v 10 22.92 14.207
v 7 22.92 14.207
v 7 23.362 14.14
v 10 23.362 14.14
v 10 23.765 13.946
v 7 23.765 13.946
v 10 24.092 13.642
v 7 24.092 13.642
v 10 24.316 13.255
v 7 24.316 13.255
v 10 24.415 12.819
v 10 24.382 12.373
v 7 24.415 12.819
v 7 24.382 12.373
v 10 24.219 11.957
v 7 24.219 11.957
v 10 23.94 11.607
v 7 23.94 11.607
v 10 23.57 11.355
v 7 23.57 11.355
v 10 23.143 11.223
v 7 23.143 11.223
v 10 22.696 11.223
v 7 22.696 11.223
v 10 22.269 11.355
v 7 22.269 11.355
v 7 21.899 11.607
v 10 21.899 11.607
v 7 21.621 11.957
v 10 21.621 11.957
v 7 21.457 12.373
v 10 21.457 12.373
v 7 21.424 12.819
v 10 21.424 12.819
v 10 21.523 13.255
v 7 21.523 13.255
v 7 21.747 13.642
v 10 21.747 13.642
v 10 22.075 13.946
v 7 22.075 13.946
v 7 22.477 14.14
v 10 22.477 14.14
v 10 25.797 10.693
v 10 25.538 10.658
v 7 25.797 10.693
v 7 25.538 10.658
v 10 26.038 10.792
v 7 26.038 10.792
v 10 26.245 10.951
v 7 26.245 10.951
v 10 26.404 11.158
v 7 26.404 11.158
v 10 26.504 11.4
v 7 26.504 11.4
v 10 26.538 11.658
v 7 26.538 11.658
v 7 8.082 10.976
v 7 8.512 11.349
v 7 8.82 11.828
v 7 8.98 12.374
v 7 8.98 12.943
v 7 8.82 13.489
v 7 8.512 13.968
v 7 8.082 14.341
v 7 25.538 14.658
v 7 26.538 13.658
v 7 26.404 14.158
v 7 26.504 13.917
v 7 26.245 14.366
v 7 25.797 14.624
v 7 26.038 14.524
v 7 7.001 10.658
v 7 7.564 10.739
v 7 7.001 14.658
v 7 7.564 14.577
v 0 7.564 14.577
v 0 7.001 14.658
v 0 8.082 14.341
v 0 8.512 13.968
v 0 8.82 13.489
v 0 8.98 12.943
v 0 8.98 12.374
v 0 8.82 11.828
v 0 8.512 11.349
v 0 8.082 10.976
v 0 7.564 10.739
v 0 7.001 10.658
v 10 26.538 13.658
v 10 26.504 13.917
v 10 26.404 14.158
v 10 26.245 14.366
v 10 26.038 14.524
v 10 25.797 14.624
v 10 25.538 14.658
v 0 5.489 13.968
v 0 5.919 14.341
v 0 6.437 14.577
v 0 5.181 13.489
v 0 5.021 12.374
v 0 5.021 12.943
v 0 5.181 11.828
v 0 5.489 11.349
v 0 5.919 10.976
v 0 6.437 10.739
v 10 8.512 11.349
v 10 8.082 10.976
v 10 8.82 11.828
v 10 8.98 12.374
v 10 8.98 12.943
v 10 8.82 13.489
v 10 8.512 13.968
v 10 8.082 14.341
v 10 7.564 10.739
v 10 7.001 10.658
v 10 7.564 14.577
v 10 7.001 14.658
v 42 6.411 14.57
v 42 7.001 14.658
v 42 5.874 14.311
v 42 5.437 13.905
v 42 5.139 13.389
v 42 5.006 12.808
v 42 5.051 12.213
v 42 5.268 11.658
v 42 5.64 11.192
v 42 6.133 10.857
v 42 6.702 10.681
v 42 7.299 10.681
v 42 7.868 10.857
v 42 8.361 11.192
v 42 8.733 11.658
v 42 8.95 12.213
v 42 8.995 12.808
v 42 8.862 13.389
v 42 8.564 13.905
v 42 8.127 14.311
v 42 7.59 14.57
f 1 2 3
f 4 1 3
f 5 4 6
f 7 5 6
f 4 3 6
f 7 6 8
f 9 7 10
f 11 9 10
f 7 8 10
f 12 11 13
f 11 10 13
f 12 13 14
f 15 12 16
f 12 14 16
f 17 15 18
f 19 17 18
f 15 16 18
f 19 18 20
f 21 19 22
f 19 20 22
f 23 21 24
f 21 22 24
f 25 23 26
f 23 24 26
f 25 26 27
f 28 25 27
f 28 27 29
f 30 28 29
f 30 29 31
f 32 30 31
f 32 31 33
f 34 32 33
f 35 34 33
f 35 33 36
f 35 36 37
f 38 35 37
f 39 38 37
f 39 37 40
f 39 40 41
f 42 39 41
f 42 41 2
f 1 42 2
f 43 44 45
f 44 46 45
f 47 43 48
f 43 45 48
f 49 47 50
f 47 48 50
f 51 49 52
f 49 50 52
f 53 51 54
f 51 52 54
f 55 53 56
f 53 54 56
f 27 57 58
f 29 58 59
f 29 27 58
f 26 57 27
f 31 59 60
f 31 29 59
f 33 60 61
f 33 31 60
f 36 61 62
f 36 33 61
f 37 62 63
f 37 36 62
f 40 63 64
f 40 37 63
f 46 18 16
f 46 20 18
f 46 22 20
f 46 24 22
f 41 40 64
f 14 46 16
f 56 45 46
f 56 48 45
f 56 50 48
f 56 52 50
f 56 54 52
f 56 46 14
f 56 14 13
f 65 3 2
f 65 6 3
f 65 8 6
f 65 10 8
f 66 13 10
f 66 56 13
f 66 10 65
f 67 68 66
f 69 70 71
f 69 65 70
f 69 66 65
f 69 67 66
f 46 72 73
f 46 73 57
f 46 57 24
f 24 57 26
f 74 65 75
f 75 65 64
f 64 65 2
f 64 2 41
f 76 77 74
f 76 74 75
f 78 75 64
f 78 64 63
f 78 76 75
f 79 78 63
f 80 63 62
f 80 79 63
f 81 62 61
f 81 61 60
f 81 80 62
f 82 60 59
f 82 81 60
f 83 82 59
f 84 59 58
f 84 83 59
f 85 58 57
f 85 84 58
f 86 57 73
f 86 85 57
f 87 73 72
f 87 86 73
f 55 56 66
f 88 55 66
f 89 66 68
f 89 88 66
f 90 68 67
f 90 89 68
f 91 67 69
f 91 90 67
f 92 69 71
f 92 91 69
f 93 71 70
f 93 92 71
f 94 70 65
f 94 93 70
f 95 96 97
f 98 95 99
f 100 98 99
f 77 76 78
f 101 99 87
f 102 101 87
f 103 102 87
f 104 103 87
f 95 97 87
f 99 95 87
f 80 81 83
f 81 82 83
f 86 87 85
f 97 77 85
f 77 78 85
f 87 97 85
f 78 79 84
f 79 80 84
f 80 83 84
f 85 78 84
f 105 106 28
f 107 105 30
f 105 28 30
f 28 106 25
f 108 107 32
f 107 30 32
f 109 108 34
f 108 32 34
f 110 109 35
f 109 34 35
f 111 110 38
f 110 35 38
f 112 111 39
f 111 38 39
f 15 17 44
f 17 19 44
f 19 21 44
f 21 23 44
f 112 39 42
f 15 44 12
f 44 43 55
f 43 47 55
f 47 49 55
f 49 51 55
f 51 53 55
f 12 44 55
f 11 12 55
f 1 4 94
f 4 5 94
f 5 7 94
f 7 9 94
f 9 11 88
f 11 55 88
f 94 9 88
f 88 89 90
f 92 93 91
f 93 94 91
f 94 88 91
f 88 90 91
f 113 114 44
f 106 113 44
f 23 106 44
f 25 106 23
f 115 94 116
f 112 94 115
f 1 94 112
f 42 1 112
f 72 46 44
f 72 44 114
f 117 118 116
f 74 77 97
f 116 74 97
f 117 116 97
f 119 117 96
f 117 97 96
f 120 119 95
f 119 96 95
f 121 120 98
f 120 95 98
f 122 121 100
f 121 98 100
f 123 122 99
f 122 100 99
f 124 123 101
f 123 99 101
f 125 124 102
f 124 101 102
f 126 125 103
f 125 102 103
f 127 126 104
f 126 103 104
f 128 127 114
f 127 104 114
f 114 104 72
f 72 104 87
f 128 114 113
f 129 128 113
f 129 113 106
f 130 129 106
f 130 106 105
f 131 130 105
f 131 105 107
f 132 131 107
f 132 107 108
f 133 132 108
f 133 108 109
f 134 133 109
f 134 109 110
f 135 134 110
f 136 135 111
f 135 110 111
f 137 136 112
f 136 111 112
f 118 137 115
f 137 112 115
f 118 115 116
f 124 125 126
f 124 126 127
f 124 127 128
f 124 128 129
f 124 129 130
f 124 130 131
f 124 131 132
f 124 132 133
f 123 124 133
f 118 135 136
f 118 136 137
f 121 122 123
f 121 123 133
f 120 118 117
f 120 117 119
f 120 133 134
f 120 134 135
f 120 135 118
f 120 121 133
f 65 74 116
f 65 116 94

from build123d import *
from build123d.topology import SkipClean

# Parameters (mm, degrees)
SKETCH1_R           = 2
BOSS_EXTRUDE1_DEPTH = 42
BOSS_EXTRUDE2_DEPTH = 10
CUT_EXTRUDE1_DEPTH  = 7
BOSS_EXTRUDE4_DEPTH = 3
SKETCH5_R           = 1.5
CUT_EXTRUDE3_DEPTH  = 54.708670792
SKETCH6_W           = 11.822480184
SKETCH6_H           = 12.15707868
CUT_EXTRUDE5_DEPTH  = 54.708670792
FILLET4_R           = 1
FILLET5_R           = 1


with BuildPart() as part:
    # Sketch1 → Boss-Extrude1 (new body)
    with BuildSketch(Plane(origin=(0, 0, 0), x_dir=(0, 0, -1), z_dir=(1, 0, 0))):
        with Locations(Location((-12.6584653, 7.000514901, 0), (0, 0, 180))):
            Circle(SKETCH1_R)
    extrude(amount=BOSS_EXTRUDE1_DEPTH)

    # Sketch2 → Boss-Extrude2 (add)
    with BuildSketch(Plane.ZY):
        with BuildLine():
            Line((10.6584653, 7.000514901), (10.6584653, 13.760469307))
            ThreePointArc((10.6584653, 13.760469307), (12.6584653, 15.760469307), (14.6584653, 13.760469307))
            Line((14.6584653, 13.760469307), (14.6584653, 7.000514901))
            ThreePointArc((14.6584653, 7.000514901), (12.6584653, 5.000514901), (10.6584653, 7.000514901))
        make_face()
    extrude(amount=-BOSS_EXTRUDE2_DEPTH)

    # Sketch3 → Cut-Extrude1 (cut)
    with SkipClean():  # the faces are left unmerged after this step: merging them gives an invalid solid
        with BuildSketch(Plane.ZY):
            with BuildLine():
                Line((10.6584653, 7.000514901), (10.6584653, 13.760469307))
                ThreePointArc((10.6584653, 13.760469307), (12.6584653, 15.760469307), (14.6584653, 13.760469307))
                Line((14.6584653, 13.760469307), (14.6584653, 7.000514901))
                ThreePointArc((14.6584653, 7.000514901), (12.6584653, 9.000514901), (10.6584653, 7.000514901))
            make_face()
        extrude(amount=-CUT_EXTRUDE1_DEPTH, mode=Mode.SUBTRACT)

    # Sketch4 → Boss-Extrude4 (add)
    with SkipClean():  # the faces are left unmerged after this step: merging them gives an invalid solid
        with BuildSketch(Plane.ZY.offset(-7)):
            with BuildLine():
                Line((10.6584653, 36.009876522), (10.6584653, 13.760469307))
                ThreePointArc((10.6584653, 13.760469307), (12.6584653, 15.760469307), (14.6584653, 13.760469307))
                Line((14.6584653, 13.760469307), (14.6584653, 36.009876522))
                Line((14.6584653, 36.009876522), (10.6584653, 36.009876522))
            make_face()
            with BuildLine():
                ThreePointArc((10.6584653, 36.009876522), (12.6584653, 38.009876522), (14.6584653, 36.009876522))
                Line((14.6584653, 36.009876522), (10.6584653, 36.009876522))
            make_face()
        extrude(amount=-BOSS_EXTRUDE4_DEPTH)

    # Sketch5 → Cut-Extrude3 (cut, through all)
    with SkipClean():  # the faces are left unmerged after this step: merging them gives an invalid solid
        with BuildSketch(Plane.ZY.offset(-7)):
            with Locations((12.706639089, 22.91954594)):
                Circle(SKETCH5_R)
        extrude(amount=-CUT_EXTRUDE3_DEPTH, mode=Mode.SUBTRACT)

    # Sketch6 → Cut-Extrude5 (cut, through all)
    with SkipClean():  # the faces are left unmerged after this step: merging them gives an invalid solid
        with BuildSketch(Plane.ZY.offset(-7)):
            with Locations((12.630555797, 32.616849438)):
                Rectangle(SKETCH6_W, SKETCH6_H)
        extrude(amount=-CUT_EXTRUDE5_DEPTH, mode=Mode.SUBTRACT)

    # Fillet4
    fillet4_edges = [part.edges().sort_by_distance(p)[0] for p in [
        (8.5, 26.538310098, 14.6584653),
    ]]
    fillet(fillet4_edges, radius=FILLET4_R)

    # Fillet5
    fillet5_edges = [part.edges().sort_by_distance(p)[0] for p in [
        (8.5, 26.538310098, 10.6584653),
    ]]
    fillet(fillet5_edges, radius=FILLET5_R)


solid = part.part
